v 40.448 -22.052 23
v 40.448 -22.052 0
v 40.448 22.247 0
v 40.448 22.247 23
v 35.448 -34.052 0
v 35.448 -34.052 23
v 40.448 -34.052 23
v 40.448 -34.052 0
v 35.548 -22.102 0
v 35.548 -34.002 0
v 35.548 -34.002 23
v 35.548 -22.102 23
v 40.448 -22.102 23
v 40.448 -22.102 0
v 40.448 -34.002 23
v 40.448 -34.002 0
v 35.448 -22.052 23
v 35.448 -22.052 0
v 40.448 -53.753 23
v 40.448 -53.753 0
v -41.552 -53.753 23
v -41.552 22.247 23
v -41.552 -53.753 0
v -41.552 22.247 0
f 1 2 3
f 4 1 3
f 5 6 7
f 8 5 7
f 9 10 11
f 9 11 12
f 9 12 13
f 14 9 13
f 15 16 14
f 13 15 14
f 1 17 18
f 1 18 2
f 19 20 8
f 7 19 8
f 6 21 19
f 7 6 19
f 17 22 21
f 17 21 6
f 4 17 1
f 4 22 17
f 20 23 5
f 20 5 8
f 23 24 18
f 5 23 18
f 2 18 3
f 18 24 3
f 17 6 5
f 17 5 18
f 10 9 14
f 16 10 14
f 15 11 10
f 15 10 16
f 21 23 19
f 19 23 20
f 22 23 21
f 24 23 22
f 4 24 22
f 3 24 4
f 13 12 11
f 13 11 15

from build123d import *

# Parameters (mm, degrees)
SKETCH_1_W          = 82
SKETCH_1_H          = 76
EXTRUDE_1_DEPTH     = 23
SKETCH_2_W          = 5
SKETCH_2_H          = 12
CUT_EXTRUDE_1_DEPTH = 23
SKETCH_5_W          = 4.9
SKETCH_5_H          = 11.9
EXTRUDE_3_DEPTH     = 23


with BuildPart() as part:
    # 草图1 → 凸台-拉伸1 (new body)
    with BuildSketch(Plane.XY):
        with Locations((-0.551569507, -15.753363229)):
            Rectangle(SKETCH_1_W, SKETCH_1_H)
    extrude(amount=EXTRUDE_1_DEPTH)

    # 草图2 → 切除-拉伸1 (cut)
    with BuildSketch(Plane.XY.offset(23)):
        with Locations((37.948430493, -28.051693566)):
            Rectangle(SKETCH_2_W, SKETCH_2_H)
    extrude(amount=-CUT_EXTRUDE_1_DEPTH, mode=Mode.SUBTRACT)


with BuildPart() as body_2:
    # 草图5 → 凸台-拉伸3 (new body)
    with BuildSketch(Plane.XY.offset(23)):
        with Locations((37.998430493, -28.051693566)):
            Rectangle(SKETCH_5_W, SKETCH_5_H)
    extrude(amount=-EXTRUDE_3_DEPTH)


solid = Compound([part.part, body_2.part])
